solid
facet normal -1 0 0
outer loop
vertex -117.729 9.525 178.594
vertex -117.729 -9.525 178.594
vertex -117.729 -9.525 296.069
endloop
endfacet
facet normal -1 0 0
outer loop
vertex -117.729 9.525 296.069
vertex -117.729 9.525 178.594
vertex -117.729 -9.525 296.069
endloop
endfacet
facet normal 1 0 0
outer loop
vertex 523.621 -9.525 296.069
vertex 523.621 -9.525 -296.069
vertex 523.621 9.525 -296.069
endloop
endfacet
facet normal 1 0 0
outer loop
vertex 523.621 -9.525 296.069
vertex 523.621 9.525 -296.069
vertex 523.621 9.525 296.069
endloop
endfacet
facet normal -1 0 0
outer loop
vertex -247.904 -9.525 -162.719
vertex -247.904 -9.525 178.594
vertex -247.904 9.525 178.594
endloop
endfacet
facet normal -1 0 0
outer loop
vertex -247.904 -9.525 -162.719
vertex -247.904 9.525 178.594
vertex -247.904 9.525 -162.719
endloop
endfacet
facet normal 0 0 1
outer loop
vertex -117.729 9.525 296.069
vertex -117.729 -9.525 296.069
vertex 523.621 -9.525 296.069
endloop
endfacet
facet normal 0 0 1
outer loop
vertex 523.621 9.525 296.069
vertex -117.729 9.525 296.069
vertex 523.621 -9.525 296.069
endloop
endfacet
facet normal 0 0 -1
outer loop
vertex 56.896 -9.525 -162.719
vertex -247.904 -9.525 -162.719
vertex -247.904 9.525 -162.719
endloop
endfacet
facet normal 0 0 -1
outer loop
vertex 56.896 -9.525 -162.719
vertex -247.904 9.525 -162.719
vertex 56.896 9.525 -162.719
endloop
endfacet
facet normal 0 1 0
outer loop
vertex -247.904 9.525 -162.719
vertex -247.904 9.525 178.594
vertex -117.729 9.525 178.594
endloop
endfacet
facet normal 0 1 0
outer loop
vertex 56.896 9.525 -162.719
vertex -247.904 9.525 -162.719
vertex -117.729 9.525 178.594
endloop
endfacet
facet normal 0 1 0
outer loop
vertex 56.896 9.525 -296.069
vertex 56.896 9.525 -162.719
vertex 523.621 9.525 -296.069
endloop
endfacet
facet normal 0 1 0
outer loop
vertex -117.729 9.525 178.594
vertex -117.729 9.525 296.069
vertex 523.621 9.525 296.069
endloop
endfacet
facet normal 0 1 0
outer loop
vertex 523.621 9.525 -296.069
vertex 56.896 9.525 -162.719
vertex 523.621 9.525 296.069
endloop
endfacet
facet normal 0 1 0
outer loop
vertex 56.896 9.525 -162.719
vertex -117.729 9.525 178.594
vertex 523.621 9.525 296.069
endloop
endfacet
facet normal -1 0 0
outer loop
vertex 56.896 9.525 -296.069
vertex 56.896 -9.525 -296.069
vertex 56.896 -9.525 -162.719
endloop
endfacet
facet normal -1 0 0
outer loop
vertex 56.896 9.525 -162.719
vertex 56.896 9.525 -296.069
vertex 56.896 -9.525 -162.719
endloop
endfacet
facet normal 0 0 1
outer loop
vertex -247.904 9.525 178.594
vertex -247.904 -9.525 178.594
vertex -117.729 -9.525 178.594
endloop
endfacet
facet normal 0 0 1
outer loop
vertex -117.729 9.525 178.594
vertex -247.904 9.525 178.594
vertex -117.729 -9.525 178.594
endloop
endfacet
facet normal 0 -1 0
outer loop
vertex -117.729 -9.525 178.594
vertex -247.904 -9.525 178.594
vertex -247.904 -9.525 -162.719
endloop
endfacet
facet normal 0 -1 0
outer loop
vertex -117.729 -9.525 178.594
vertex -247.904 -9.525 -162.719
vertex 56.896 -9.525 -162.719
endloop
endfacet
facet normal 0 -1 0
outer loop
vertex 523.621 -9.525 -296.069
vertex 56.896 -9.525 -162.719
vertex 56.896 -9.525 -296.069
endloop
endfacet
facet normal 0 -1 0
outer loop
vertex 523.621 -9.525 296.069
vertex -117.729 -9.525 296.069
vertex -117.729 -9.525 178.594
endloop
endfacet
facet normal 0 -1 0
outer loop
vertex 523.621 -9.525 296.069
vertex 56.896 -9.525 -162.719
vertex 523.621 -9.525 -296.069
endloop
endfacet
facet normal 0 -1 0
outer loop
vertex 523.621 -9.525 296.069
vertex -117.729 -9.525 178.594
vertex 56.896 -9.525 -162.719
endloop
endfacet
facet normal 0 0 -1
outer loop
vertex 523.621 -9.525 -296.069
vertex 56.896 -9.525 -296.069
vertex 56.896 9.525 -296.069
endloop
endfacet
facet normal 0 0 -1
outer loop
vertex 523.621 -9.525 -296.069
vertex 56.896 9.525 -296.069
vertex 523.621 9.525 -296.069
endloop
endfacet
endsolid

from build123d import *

# Parameters (mm, degrees)
F0_W     = 771.525
F0_H     = 296.06875
F1_DEPTH = 9.525
F2_W     = 304.8
F2_H     = 133.35
F3_DEPTH = 19.051
F4_W     = 130.175
F4_H     = 117.475
F5_DEPTH = 19.051


with BuildPart() as f1:
    # F0 (on Front) → F1 (new body, symmetric)
    with BuildSketch(Plane.XZ):
        with Locations((137.8585046741, 148.034375)):
            Rectangle(F0_W, F0_H)
        with Locations((137.8585046741, -148.034375)):
            Rectangle(F0_W, F0_H)
    extrude(amount=F1_DEPTH, both=True)

    # F2 (on face) → F3 (cut, through all)
    with BuildSketch(Plane.XZ.offset(9.525)):
        with Locations((-95.5039953259, -229.39375)):
            Rectangle(F2_W, F2_H)
    extrude(amount=-F3_DEPTH, mode=Mode.SUBTRACT)

    # F4 (on face) → F5 (cut, through all)
    with BuildSketch(Plane.XZ.offset(9.525)):
        with Locations((-182.8164953259, 237.33125)):
            Rectangle(F4_W, F4_H)
    extrude(amount=-F5_DEPTH, mode=Mode.SUBTRACT)


solid = f1.part
